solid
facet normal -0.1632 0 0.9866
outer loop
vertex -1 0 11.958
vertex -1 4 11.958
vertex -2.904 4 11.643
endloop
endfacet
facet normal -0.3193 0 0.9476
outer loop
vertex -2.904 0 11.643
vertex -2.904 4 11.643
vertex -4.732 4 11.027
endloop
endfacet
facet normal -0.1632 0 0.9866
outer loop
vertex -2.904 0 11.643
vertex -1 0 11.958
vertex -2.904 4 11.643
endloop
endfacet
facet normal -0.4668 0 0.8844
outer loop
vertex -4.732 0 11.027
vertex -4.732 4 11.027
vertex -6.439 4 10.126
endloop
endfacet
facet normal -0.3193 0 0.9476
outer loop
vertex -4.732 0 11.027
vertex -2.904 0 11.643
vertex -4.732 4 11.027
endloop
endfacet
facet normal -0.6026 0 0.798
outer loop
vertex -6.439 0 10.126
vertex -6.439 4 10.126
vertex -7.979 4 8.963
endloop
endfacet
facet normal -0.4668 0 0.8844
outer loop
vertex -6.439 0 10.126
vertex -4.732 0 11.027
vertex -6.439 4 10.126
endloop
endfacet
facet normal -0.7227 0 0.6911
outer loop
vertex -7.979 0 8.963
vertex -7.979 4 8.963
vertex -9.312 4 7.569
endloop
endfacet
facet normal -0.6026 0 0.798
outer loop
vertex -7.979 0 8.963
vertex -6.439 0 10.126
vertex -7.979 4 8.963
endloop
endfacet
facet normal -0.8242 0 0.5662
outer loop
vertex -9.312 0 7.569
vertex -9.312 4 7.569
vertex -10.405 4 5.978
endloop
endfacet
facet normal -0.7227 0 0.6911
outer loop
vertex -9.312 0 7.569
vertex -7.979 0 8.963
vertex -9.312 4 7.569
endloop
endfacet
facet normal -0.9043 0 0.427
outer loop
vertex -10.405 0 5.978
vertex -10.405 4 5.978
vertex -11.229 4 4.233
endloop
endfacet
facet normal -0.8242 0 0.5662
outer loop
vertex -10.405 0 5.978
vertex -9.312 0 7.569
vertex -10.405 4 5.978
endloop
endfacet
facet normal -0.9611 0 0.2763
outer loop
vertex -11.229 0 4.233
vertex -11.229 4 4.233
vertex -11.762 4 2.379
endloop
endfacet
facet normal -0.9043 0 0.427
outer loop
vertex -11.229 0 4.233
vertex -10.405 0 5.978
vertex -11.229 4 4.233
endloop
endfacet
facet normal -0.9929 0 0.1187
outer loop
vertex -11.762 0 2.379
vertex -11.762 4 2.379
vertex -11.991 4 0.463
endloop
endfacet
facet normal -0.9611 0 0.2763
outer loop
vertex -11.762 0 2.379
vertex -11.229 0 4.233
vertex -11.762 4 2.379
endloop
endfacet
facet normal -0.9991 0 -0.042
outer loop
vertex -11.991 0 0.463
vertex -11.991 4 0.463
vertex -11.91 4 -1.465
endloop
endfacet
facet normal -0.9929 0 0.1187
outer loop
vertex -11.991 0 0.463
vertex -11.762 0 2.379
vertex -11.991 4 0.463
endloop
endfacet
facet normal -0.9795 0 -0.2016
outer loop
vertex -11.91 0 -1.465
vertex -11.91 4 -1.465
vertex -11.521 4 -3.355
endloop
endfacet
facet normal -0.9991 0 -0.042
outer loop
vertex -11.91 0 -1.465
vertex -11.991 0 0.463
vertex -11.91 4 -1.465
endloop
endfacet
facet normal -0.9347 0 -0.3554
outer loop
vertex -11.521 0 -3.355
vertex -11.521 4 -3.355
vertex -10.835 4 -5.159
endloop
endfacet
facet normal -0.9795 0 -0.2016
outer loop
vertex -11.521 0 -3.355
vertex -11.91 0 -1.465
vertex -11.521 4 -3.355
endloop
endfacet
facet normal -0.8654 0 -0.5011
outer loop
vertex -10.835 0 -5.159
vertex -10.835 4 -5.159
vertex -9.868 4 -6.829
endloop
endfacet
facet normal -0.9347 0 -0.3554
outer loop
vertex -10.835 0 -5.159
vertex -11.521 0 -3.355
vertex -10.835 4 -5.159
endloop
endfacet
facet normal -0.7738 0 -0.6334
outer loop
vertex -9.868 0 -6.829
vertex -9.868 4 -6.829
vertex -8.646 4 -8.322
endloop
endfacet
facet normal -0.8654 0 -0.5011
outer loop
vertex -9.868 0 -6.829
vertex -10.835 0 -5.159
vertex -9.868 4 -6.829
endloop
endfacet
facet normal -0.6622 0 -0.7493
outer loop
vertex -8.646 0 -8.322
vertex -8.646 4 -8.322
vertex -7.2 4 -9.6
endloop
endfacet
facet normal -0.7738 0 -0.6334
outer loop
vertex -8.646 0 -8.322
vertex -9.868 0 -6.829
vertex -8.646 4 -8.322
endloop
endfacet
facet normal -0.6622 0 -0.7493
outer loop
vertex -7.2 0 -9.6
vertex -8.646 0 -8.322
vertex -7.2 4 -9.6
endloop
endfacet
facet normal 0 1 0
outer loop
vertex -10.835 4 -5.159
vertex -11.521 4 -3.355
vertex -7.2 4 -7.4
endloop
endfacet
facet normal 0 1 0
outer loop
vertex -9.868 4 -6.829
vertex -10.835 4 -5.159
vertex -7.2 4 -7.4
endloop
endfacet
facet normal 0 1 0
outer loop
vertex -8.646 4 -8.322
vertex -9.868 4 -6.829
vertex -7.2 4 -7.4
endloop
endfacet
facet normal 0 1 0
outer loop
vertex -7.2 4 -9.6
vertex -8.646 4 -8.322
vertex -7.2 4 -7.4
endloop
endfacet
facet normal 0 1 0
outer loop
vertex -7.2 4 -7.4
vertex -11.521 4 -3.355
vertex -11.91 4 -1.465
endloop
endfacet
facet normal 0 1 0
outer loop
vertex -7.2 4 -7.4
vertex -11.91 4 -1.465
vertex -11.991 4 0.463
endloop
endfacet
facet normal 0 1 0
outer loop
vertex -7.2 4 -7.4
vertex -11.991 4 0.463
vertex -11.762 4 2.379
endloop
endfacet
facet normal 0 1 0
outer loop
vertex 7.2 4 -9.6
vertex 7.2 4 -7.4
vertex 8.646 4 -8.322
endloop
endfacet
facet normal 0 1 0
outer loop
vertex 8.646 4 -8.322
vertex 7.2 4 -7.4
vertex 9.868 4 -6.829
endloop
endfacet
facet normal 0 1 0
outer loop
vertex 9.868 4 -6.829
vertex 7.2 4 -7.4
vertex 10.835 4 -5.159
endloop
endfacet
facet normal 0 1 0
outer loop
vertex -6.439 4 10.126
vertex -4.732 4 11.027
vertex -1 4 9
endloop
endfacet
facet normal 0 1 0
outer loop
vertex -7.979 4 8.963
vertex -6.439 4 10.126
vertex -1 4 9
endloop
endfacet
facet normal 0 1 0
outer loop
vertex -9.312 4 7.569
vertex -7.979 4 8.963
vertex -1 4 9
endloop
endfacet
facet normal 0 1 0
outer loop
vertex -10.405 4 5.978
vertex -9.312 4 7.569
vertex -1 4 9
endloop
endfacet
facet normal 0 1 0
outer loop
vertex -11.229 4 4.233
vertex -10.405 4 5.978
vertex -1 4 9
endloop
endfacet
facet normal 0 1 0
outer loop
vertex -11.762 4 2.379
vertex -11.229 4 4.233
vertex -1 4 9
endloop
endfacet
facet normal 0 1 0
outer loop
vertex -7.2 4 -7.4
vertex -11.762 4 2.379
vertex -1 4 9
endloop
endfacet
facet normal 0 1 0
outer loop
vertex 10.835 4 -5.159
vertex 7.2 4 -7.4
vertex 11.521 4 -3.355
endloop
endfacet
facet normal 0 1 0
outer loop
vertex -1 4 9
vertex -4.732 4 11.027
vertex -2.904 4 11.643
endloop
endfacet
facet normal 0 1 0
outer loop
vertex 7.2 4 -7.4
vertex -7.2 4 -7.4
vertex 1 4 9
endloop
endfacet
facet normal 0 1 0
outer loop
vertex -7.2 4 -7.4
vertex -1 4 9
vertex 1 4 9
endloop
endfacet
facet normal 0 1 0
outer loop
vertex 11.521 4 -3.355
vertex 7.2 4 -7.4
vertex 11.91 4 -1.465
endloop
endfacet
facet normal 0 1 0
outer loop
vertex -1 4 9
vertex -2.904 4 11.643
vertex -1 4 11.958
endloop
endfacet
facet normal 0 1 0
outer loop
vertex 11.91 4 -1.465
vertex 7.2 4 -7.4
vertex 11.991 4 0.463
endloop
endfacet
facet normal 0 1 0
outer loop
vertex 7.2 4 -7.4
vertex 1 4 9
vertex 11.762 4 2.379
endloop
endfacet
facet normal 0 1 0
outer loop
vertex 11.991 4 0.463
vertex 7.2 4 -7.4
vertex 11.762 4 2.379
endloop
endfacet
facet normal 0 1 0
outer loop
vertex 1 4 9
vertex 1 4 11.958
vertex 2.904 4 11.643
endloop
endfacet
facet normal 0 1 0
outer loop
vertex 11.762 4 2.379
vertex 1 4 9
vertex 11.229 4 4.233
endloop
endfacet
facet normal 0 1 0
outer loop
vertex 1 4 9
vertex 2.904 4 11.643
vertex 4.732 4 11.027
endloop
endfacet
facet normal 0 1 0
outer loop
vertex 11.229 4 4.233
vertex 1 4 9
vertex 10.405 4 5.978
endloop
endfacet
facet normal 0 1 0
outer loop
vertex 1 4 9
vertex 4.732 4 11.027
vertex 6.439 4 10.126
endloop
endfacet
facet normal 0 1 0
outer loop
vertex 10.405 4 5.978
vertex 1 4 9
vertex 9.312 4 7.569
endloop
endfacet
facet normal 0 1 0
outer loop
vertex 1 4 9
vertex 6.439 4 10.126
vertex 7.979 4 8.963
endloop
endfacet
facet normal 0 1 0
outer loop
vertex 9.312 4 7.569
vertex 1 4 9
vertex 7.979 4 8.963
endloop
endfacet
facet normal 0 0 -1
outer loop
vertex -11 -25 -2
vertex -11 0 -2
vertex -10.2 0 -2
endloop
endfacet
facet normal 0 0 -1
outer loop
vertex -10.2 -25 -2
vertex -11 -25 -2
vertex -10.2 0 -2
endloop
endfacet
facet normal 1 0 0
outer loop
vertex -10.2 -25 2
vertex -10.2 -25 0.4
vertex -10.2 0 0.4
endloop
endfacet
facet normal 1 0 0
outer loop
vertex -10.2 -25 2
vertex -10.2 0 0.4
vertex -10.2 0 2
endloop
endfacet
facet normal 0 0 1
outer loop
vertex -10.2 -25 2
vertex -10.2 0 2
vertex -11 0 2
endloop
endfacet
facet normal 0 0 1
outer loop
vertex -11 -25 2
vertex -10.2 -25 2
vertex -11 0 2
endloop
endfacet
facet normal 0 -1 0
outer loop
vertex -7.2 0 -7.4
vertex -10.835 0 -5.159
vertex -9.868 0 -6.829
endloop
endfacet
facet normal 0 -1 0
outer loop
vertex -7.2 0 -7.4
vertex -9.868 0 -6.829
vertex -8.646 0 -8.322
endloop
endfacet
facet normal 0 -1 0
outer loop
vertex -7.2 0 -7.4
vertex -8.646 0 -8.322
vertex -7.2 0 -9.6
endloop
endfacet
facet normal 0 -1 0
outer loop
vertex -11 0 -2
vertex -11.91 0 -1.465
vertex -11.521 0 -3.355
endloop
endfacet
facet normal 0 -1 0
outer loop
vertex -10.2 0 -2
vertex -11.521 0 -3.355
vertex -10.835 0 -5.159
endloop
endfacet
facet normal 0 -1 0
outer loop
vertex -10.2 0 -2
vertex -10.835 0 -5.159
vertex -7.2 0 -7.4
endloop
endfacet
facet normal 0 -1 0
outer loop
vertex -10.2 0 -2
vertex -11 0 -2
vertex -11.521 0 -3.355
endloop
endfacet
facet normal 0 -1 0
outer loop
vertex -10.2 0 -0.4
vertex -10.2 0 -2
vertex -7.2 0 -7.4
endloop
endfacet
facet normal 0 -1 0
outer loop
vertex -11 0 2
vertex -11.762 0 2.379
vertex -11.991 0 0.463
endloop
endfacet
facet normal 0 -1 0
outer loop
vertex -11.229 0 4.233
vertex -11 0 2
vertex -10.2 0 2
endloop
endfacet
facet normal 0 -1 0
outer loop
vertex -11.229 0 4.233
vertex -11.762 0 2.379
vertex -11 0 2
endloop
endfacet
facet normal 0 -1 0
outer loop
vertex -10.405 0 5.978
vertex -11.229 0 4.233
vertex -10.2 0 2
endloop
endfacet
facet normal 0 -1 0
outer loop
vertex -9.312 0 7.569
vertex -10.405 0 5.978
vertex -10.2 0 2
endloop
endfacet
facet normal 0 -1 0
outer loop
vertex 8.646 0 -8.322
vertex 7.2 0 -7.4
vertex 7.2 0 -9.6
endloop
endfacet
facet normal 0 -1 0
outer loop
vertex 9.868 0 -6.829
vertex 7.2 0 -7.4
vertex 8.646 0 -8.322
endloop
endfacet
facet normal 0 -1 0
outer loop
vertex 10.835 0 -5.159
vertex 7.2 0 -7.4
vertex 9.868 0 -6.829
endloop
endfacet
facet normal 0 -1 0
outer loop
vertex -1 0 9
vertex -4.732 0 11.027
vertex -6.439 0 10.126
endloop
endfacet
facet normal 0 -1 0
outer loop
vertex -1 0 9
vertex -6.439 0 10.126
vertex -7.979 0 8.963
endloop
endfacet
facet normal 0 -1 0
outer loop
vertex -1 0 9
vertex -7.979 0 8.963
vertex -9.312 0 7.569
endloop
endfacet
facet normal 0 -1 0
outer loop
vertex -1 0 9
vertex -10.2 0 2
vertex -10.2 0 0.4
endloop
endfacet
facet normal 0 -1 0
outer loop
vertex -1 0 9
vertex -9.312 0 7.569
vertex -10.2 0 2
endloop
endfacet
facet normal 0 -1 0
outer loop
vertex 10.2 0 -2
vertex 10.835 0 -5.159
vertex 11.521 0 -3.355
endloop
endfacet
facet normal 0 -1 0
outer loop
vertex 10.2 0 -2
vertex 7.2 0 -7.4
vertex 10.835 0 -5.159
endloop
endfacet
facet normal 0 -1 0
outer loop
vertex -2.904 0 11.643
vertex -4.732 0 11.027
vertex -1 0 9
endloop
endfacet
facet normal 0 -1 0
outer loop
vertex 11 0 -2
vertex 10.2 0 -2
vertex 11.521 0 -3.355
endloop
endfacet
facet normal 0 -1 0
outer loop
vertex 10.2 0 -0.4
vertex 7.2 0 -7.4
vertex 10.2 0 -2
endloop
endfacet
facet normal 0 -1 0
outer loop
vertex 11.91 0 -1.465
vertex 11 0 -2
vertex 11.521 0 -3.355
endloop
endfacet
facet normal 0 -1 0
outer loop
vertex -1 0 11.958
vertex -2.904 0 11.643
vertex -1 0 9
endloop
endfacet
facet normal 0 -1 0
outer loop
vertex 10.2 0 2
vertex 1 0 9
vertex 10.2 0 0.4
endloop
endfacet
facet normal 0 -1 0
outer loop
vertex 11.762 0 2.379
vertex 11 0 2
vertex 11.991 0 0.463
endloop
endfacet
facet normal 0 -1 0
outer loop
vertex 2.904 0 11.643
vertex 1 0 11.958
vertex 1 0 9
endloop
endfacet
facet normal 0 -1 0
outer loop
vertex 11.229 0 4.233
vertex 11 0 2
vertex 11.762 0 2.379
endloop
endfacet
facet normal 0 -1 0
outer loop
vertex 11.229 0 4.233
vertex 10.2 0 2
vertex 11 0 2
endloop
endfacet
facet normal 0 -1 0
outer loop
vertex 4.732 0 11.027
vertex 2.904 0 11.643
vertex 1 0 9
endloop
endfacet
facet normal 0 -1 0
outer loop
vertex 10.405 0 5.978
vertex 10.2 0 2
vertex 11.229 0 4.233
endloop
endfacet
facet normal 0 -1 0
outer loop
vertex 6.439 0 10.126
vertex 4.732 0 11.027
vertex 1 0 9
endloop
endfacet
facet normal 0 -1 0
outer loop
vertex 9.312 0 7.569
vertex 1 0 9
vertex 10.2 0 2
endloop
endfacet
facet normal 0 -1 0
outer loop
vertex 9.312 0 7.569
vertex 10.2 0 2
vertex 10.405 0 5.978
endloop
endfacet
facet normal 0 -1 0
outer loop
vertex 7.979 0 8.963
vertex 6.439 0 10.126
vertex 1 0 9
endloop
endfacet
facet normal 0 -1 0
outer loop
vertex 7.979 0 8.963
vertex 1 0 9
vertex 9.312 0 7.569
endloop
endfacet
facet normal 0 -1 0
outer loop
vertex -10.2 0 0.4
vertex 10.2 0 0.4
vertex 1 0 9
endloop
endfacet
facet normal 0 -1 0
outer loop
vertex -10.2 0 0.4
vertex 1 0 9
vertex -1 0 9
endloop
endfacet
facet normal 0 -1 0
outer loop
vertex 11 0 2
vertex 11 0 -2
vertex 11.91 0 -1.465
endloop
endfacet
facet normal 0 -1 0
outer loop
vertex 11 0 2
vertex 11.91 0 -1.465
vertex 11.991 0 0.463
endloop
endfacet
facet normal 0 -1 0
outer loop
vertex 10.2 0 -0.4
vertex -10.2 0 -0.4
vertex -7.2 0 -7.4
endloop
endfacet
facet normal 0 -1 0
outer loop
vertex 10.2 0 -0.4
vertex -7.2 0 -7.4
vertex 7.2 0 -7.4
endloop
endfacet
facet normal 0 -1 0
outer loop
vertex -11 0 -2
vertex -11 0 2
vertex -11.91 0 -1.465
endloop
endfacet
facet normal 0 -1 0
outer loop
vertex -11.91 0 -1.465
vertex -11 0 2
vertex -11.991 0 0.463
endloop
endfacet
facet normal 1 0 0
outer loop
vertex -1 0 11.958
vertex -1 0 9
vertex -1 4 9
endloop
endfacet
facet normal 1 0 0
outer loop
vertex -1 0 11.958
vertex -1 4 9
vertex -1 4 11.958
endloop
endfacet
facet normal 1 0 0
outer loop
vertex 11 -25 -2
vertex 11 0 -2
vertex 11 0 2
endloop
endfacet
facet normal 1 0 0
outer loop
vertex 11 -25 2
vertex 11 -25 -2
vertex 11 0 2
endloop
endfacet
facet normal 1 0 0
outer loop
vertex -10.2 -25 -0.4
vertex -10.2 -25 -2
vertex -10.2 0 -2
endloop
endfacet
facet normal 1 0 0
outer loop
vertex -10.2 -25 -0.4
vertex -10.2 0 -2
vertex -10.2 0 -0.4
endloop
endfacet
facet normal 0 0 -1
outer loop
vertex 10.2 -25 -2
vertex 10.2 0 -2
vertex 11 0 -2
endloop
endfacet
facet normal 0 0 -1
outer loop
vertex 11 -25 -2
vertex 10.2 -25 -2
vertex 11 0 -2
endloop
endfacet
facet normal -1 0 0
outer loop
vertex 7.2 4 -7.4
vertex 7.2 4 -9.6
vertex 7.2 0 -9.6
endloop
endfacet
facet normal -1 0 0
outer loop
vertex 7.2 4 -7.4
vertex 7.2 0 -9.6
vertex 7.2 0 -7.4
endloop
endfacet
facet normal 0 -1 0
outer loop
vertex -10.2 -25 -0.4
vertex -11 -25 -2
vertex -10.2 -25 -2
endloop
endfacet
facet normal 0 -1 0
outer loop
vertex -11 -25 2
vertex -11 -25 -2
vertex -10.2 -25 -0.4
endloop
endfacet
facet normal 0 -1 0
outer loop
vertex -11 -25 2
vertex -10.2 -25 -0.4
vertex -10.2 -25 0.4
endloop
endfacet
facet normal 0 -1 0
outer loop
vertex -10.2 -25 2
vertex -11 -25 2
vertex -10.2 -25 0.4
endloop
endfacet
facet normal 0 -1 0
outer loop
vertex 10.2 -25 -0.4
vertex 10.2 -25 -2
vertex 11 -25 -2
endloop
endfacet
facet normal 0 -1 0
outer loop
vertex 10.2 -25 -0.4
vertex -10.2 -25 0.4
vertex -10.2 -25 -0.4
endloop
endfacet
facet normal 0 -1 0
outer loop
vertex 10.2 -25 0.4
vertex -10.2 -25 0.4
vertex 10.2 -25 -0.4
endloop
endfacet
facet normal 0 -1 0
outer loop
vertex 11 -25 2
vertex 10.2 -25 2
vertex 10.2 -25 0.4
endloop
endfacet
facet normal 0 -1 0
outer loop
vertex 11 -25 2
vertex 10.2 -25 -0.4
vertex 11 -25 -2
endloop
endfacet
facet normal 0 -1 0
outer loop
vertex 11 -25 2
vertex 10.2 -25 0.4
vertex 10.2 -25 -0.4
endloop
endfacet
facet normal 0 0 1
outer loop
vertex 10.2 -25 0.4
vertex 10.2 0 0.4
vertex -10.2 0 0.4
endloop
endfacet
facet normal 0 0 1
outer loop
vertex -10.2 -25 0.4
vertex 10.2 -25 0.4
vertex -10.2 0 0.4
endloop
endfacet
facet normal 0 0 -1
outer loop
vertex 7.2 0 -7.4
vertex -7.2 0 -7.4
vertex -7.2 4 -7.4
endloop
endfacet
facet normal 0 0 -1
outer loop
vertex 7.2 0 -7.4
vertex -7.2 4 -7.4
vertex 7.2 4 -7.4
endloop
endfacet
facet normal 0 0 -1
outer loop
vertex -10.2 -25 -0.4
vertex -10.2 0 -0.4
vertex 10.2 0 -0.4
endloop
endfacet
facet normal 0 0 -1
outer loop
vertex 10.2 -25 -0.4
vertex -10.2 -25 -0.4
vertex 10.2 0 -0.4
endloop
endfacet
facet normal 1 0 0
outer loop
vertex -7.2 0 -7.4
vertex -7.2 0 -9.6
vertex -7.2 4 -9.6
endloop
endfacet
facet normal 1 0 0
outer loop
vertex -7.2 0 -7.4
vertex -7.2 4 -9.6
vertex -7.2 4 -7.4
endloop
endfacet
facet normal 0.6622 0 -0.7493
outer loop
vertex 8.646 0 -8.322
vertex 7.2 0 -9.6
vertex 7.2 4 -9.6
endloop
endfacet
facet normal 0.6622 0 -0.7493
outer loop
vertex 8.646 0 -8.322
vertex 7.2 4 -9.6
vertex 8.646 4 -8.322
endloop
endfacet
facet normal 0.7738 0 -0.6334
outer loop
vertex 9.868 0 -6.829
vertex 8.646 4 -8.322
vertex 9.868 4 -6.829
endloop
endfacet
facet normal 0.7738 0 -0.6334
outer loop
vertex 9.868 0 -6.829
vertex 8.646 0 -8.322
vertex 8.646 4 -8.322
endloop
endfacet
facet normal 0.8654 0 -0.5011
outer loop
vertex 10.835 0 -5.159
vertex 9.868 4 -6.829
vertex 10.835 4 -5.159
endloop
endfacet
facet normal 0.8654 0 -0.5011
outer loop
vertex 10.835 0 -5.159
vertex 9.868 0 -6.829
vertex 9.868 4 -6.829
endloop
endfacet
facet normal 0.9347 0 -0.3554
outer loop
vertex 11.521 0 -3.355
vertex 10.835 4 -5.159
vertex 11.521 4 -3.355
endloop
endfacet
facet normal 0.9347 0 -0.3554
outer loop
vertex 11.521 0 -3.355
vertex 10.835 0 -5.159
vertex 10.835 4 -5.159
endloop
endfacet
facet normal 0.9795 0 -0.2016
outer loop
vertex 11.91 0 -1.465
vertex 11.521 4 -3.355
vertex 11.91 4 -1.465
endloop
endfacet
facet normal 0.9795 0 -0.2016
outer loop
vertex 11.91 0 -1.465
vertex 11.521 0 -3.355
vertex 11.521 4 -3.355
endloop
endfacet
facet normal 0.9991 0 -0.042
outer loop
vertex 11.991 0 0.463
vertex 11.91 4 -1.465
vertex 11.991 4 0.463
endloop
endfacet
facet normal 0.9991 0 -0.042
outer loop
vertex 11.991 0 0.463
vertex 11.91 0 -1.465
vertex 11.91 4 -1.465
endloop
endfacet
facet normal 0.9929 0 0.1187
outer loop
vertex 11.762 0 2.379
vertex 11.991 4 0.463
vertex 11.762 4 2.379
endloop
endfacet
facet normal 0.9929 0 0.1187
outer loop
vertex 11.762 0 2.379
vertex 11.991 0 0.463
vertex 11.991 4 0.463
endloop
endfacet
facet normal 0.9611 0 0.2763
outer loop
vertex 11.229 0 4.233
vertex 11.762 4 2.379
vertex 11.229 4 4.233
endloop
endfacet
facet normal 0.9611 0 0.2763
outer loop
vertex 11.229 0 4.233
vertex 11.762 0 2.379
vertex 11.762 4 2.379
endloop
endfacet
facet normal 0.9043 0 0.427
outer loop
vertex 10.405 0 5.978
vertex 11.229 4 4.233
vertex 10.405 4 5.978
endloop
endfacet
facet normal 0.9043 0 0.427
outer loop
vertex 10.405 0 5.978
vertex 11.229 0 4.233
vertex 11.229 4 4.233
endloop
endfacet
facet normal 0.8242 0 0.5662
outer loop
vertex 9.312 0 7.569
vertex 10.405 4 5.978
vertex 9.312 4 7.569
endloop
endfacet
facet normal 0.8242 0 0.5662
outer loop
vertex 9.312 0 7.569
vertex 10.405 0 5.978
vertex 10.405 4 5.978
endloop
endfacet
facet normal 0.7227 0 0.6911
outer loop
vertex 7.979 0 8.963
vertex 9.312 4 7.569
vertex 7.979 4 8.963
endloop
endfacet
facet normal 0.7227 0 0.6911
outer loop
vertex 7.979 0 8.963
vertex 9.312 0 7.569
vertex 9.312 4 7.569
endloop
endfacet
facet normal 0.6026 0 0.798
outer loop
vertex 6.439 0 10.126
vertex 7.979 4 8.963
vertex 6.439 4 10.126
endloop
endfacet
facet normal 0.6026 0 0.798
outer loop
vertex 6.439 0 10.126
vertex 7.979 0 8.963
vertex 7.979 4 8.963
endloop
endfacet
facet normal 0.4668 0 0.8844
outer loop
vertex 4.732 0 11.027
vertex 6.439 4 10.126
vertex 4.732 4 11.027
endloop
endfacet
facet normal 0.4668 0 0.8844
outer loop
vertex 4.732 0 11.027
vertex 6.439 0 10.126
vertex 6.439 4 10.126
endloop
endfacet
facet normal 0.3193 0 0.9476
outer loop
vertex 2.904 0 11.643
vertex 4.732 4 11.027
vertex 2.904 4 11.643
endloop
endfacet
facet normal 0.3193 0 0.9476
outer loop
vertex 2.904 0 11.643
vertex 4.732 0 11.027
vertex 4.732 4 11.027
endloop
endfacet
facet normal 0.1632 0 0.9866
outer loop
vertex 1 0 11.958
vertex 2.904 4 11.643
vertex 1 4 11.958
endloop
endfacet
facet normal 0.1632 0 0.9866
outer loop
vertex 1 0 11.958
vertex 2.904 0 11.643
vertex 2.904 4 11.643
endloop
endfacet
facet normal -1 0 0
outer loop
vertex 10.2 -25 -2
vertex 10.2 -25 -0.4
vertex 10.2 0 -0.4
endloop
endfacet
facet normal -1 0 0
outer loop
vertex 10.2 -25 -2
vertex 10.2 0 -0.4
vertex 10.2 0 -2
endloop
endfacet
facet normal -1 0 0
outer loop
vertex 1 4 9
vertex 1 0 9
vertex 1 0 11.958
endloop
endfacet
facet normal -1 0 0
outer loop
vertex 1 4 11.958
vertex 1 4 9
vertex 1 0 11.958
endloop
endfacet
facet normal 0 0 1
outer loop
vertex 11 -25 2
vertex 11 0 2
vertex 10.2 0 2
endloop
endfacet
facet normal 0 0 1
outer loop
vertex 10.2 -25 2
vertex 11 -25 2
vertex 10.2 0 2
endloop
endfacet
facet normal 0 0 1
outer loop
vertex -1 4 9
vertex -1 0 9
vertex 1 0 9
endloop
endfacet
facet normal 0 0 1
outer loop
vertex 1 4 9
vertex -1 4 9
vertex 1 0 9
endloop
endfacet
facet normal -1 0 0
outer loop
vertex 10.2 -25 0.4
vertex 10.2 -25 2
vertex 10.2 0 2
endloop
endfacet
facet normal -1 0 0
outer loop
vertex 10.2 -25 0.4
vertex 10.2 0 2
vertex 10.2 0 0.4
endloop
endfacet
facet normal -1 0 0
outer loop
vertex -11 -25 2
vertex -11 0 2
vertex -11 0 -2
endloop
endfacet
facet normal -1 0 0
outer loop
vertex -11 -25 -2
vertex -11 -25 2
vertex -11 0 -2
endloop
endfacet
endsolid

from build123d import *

# Parameters (mm, degrees)
F1_R     = 12
F2_DEPTH = 4
F3_DEPTH = 25
F4_W     = 2
F4_H     = 5.621666
F4_W_2   = 14.4
F4_H_2   = 10
F5_DEPTH = 4.001


with BuildPart() as f2:
    # F1 (on Front) → F2 (new body)
    with BuildSketch(Plane.XZ):
        Circle(F1_R)
    extrude(amount=-F2_DEPTH)

    # F0 (on Front) → F3 (join)
    with BuildSketch(Plane.XZ):
        Polygon((10.2, 0.4), (-10.2, 0.4), (-10.2, 2), (-11, 2), (-11, -2), (-10.2, -2), (-10.2, -0.4), (10.2, -0.4), (10.2, -2), (11, -2), (11, 2), (10.2, 2), align=None)
    extrude(amount=F3_DEPTH)

    # F4 (on face) → F5 (cut, through all)
    with BuildSketch(Plane.XZ):
        with Locations((0, 11.810833)):
            Rectangle(F4_W, F4_H)
        with Locations((0, -12.4)):
            Rectangle(F4_W_2, F4_H_2)
    extrude(amount=-F5_DEPTH, mode=Mode.SUBTRACT)


solid = f2.part
